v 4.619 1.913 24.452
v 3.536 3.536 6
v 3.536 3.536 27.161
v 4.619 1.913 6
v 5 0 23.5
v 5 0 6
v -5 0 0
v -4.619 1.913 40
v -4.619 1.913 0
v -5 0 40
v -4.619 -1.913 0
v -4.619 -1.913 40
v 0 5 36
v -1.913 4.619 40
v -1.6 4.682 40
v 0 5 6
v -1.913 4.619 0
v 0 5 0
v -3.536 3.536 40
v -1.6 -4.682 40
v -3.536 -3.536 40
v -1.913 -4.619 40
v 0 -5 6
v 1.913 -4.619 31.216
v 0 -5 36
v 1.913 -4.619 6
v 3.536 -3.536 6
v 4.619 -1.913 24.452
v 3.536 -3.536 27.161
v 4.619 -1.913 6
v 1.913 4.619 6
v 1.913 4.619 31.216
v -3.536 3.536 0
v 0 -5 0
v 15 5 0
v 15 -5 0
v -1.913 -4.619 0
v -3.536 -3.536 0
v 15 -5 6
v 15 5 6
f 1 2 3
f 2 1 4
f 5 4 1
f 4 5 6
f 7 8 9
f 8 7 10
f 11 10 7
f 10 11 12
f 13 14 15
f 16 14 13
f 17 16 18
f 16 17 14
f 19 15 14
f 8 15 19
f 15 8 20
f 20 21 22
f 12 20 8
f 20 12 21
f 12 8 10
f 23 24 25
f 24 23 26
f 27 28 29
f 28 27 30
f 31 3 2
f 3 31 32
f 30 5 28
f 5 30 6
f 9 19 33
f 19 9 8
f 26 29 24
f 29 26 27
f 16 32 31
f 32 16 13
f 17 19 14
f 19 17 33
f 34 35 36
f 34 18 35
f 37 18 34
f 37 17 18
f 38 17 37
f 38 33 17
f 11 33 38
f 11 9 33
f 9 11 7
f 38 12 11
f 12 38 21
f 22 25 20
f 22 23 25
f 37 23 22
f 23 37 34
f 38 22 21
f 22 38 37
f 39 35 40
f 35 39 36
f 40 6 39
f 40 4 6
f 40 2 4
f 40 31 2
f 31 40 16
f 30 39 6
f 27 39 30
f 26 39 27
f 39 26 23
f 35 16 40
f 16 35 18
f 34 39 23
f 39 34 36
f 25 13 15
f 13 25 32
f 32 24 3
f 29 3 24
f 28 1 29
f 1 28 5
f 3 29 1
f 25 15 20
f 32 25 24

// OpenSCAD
difference() {
    union() {
        cylinder( r=5, h=40 );

        translate( [ 0, -5, 0 ] )
        cube( [ 15, 10, 6 ] );
    }

    translate( [ 6, 6, 21 ] )
    rotate( [ 0, -90, 0 ] )
    rotate( [ 90, 0, 0 ] )
    linear_extrude( 12 ) {
        polygon( [[ 0, 0 ], [ 30, 0 ], [ 30, 12 ]] );
    }
}
